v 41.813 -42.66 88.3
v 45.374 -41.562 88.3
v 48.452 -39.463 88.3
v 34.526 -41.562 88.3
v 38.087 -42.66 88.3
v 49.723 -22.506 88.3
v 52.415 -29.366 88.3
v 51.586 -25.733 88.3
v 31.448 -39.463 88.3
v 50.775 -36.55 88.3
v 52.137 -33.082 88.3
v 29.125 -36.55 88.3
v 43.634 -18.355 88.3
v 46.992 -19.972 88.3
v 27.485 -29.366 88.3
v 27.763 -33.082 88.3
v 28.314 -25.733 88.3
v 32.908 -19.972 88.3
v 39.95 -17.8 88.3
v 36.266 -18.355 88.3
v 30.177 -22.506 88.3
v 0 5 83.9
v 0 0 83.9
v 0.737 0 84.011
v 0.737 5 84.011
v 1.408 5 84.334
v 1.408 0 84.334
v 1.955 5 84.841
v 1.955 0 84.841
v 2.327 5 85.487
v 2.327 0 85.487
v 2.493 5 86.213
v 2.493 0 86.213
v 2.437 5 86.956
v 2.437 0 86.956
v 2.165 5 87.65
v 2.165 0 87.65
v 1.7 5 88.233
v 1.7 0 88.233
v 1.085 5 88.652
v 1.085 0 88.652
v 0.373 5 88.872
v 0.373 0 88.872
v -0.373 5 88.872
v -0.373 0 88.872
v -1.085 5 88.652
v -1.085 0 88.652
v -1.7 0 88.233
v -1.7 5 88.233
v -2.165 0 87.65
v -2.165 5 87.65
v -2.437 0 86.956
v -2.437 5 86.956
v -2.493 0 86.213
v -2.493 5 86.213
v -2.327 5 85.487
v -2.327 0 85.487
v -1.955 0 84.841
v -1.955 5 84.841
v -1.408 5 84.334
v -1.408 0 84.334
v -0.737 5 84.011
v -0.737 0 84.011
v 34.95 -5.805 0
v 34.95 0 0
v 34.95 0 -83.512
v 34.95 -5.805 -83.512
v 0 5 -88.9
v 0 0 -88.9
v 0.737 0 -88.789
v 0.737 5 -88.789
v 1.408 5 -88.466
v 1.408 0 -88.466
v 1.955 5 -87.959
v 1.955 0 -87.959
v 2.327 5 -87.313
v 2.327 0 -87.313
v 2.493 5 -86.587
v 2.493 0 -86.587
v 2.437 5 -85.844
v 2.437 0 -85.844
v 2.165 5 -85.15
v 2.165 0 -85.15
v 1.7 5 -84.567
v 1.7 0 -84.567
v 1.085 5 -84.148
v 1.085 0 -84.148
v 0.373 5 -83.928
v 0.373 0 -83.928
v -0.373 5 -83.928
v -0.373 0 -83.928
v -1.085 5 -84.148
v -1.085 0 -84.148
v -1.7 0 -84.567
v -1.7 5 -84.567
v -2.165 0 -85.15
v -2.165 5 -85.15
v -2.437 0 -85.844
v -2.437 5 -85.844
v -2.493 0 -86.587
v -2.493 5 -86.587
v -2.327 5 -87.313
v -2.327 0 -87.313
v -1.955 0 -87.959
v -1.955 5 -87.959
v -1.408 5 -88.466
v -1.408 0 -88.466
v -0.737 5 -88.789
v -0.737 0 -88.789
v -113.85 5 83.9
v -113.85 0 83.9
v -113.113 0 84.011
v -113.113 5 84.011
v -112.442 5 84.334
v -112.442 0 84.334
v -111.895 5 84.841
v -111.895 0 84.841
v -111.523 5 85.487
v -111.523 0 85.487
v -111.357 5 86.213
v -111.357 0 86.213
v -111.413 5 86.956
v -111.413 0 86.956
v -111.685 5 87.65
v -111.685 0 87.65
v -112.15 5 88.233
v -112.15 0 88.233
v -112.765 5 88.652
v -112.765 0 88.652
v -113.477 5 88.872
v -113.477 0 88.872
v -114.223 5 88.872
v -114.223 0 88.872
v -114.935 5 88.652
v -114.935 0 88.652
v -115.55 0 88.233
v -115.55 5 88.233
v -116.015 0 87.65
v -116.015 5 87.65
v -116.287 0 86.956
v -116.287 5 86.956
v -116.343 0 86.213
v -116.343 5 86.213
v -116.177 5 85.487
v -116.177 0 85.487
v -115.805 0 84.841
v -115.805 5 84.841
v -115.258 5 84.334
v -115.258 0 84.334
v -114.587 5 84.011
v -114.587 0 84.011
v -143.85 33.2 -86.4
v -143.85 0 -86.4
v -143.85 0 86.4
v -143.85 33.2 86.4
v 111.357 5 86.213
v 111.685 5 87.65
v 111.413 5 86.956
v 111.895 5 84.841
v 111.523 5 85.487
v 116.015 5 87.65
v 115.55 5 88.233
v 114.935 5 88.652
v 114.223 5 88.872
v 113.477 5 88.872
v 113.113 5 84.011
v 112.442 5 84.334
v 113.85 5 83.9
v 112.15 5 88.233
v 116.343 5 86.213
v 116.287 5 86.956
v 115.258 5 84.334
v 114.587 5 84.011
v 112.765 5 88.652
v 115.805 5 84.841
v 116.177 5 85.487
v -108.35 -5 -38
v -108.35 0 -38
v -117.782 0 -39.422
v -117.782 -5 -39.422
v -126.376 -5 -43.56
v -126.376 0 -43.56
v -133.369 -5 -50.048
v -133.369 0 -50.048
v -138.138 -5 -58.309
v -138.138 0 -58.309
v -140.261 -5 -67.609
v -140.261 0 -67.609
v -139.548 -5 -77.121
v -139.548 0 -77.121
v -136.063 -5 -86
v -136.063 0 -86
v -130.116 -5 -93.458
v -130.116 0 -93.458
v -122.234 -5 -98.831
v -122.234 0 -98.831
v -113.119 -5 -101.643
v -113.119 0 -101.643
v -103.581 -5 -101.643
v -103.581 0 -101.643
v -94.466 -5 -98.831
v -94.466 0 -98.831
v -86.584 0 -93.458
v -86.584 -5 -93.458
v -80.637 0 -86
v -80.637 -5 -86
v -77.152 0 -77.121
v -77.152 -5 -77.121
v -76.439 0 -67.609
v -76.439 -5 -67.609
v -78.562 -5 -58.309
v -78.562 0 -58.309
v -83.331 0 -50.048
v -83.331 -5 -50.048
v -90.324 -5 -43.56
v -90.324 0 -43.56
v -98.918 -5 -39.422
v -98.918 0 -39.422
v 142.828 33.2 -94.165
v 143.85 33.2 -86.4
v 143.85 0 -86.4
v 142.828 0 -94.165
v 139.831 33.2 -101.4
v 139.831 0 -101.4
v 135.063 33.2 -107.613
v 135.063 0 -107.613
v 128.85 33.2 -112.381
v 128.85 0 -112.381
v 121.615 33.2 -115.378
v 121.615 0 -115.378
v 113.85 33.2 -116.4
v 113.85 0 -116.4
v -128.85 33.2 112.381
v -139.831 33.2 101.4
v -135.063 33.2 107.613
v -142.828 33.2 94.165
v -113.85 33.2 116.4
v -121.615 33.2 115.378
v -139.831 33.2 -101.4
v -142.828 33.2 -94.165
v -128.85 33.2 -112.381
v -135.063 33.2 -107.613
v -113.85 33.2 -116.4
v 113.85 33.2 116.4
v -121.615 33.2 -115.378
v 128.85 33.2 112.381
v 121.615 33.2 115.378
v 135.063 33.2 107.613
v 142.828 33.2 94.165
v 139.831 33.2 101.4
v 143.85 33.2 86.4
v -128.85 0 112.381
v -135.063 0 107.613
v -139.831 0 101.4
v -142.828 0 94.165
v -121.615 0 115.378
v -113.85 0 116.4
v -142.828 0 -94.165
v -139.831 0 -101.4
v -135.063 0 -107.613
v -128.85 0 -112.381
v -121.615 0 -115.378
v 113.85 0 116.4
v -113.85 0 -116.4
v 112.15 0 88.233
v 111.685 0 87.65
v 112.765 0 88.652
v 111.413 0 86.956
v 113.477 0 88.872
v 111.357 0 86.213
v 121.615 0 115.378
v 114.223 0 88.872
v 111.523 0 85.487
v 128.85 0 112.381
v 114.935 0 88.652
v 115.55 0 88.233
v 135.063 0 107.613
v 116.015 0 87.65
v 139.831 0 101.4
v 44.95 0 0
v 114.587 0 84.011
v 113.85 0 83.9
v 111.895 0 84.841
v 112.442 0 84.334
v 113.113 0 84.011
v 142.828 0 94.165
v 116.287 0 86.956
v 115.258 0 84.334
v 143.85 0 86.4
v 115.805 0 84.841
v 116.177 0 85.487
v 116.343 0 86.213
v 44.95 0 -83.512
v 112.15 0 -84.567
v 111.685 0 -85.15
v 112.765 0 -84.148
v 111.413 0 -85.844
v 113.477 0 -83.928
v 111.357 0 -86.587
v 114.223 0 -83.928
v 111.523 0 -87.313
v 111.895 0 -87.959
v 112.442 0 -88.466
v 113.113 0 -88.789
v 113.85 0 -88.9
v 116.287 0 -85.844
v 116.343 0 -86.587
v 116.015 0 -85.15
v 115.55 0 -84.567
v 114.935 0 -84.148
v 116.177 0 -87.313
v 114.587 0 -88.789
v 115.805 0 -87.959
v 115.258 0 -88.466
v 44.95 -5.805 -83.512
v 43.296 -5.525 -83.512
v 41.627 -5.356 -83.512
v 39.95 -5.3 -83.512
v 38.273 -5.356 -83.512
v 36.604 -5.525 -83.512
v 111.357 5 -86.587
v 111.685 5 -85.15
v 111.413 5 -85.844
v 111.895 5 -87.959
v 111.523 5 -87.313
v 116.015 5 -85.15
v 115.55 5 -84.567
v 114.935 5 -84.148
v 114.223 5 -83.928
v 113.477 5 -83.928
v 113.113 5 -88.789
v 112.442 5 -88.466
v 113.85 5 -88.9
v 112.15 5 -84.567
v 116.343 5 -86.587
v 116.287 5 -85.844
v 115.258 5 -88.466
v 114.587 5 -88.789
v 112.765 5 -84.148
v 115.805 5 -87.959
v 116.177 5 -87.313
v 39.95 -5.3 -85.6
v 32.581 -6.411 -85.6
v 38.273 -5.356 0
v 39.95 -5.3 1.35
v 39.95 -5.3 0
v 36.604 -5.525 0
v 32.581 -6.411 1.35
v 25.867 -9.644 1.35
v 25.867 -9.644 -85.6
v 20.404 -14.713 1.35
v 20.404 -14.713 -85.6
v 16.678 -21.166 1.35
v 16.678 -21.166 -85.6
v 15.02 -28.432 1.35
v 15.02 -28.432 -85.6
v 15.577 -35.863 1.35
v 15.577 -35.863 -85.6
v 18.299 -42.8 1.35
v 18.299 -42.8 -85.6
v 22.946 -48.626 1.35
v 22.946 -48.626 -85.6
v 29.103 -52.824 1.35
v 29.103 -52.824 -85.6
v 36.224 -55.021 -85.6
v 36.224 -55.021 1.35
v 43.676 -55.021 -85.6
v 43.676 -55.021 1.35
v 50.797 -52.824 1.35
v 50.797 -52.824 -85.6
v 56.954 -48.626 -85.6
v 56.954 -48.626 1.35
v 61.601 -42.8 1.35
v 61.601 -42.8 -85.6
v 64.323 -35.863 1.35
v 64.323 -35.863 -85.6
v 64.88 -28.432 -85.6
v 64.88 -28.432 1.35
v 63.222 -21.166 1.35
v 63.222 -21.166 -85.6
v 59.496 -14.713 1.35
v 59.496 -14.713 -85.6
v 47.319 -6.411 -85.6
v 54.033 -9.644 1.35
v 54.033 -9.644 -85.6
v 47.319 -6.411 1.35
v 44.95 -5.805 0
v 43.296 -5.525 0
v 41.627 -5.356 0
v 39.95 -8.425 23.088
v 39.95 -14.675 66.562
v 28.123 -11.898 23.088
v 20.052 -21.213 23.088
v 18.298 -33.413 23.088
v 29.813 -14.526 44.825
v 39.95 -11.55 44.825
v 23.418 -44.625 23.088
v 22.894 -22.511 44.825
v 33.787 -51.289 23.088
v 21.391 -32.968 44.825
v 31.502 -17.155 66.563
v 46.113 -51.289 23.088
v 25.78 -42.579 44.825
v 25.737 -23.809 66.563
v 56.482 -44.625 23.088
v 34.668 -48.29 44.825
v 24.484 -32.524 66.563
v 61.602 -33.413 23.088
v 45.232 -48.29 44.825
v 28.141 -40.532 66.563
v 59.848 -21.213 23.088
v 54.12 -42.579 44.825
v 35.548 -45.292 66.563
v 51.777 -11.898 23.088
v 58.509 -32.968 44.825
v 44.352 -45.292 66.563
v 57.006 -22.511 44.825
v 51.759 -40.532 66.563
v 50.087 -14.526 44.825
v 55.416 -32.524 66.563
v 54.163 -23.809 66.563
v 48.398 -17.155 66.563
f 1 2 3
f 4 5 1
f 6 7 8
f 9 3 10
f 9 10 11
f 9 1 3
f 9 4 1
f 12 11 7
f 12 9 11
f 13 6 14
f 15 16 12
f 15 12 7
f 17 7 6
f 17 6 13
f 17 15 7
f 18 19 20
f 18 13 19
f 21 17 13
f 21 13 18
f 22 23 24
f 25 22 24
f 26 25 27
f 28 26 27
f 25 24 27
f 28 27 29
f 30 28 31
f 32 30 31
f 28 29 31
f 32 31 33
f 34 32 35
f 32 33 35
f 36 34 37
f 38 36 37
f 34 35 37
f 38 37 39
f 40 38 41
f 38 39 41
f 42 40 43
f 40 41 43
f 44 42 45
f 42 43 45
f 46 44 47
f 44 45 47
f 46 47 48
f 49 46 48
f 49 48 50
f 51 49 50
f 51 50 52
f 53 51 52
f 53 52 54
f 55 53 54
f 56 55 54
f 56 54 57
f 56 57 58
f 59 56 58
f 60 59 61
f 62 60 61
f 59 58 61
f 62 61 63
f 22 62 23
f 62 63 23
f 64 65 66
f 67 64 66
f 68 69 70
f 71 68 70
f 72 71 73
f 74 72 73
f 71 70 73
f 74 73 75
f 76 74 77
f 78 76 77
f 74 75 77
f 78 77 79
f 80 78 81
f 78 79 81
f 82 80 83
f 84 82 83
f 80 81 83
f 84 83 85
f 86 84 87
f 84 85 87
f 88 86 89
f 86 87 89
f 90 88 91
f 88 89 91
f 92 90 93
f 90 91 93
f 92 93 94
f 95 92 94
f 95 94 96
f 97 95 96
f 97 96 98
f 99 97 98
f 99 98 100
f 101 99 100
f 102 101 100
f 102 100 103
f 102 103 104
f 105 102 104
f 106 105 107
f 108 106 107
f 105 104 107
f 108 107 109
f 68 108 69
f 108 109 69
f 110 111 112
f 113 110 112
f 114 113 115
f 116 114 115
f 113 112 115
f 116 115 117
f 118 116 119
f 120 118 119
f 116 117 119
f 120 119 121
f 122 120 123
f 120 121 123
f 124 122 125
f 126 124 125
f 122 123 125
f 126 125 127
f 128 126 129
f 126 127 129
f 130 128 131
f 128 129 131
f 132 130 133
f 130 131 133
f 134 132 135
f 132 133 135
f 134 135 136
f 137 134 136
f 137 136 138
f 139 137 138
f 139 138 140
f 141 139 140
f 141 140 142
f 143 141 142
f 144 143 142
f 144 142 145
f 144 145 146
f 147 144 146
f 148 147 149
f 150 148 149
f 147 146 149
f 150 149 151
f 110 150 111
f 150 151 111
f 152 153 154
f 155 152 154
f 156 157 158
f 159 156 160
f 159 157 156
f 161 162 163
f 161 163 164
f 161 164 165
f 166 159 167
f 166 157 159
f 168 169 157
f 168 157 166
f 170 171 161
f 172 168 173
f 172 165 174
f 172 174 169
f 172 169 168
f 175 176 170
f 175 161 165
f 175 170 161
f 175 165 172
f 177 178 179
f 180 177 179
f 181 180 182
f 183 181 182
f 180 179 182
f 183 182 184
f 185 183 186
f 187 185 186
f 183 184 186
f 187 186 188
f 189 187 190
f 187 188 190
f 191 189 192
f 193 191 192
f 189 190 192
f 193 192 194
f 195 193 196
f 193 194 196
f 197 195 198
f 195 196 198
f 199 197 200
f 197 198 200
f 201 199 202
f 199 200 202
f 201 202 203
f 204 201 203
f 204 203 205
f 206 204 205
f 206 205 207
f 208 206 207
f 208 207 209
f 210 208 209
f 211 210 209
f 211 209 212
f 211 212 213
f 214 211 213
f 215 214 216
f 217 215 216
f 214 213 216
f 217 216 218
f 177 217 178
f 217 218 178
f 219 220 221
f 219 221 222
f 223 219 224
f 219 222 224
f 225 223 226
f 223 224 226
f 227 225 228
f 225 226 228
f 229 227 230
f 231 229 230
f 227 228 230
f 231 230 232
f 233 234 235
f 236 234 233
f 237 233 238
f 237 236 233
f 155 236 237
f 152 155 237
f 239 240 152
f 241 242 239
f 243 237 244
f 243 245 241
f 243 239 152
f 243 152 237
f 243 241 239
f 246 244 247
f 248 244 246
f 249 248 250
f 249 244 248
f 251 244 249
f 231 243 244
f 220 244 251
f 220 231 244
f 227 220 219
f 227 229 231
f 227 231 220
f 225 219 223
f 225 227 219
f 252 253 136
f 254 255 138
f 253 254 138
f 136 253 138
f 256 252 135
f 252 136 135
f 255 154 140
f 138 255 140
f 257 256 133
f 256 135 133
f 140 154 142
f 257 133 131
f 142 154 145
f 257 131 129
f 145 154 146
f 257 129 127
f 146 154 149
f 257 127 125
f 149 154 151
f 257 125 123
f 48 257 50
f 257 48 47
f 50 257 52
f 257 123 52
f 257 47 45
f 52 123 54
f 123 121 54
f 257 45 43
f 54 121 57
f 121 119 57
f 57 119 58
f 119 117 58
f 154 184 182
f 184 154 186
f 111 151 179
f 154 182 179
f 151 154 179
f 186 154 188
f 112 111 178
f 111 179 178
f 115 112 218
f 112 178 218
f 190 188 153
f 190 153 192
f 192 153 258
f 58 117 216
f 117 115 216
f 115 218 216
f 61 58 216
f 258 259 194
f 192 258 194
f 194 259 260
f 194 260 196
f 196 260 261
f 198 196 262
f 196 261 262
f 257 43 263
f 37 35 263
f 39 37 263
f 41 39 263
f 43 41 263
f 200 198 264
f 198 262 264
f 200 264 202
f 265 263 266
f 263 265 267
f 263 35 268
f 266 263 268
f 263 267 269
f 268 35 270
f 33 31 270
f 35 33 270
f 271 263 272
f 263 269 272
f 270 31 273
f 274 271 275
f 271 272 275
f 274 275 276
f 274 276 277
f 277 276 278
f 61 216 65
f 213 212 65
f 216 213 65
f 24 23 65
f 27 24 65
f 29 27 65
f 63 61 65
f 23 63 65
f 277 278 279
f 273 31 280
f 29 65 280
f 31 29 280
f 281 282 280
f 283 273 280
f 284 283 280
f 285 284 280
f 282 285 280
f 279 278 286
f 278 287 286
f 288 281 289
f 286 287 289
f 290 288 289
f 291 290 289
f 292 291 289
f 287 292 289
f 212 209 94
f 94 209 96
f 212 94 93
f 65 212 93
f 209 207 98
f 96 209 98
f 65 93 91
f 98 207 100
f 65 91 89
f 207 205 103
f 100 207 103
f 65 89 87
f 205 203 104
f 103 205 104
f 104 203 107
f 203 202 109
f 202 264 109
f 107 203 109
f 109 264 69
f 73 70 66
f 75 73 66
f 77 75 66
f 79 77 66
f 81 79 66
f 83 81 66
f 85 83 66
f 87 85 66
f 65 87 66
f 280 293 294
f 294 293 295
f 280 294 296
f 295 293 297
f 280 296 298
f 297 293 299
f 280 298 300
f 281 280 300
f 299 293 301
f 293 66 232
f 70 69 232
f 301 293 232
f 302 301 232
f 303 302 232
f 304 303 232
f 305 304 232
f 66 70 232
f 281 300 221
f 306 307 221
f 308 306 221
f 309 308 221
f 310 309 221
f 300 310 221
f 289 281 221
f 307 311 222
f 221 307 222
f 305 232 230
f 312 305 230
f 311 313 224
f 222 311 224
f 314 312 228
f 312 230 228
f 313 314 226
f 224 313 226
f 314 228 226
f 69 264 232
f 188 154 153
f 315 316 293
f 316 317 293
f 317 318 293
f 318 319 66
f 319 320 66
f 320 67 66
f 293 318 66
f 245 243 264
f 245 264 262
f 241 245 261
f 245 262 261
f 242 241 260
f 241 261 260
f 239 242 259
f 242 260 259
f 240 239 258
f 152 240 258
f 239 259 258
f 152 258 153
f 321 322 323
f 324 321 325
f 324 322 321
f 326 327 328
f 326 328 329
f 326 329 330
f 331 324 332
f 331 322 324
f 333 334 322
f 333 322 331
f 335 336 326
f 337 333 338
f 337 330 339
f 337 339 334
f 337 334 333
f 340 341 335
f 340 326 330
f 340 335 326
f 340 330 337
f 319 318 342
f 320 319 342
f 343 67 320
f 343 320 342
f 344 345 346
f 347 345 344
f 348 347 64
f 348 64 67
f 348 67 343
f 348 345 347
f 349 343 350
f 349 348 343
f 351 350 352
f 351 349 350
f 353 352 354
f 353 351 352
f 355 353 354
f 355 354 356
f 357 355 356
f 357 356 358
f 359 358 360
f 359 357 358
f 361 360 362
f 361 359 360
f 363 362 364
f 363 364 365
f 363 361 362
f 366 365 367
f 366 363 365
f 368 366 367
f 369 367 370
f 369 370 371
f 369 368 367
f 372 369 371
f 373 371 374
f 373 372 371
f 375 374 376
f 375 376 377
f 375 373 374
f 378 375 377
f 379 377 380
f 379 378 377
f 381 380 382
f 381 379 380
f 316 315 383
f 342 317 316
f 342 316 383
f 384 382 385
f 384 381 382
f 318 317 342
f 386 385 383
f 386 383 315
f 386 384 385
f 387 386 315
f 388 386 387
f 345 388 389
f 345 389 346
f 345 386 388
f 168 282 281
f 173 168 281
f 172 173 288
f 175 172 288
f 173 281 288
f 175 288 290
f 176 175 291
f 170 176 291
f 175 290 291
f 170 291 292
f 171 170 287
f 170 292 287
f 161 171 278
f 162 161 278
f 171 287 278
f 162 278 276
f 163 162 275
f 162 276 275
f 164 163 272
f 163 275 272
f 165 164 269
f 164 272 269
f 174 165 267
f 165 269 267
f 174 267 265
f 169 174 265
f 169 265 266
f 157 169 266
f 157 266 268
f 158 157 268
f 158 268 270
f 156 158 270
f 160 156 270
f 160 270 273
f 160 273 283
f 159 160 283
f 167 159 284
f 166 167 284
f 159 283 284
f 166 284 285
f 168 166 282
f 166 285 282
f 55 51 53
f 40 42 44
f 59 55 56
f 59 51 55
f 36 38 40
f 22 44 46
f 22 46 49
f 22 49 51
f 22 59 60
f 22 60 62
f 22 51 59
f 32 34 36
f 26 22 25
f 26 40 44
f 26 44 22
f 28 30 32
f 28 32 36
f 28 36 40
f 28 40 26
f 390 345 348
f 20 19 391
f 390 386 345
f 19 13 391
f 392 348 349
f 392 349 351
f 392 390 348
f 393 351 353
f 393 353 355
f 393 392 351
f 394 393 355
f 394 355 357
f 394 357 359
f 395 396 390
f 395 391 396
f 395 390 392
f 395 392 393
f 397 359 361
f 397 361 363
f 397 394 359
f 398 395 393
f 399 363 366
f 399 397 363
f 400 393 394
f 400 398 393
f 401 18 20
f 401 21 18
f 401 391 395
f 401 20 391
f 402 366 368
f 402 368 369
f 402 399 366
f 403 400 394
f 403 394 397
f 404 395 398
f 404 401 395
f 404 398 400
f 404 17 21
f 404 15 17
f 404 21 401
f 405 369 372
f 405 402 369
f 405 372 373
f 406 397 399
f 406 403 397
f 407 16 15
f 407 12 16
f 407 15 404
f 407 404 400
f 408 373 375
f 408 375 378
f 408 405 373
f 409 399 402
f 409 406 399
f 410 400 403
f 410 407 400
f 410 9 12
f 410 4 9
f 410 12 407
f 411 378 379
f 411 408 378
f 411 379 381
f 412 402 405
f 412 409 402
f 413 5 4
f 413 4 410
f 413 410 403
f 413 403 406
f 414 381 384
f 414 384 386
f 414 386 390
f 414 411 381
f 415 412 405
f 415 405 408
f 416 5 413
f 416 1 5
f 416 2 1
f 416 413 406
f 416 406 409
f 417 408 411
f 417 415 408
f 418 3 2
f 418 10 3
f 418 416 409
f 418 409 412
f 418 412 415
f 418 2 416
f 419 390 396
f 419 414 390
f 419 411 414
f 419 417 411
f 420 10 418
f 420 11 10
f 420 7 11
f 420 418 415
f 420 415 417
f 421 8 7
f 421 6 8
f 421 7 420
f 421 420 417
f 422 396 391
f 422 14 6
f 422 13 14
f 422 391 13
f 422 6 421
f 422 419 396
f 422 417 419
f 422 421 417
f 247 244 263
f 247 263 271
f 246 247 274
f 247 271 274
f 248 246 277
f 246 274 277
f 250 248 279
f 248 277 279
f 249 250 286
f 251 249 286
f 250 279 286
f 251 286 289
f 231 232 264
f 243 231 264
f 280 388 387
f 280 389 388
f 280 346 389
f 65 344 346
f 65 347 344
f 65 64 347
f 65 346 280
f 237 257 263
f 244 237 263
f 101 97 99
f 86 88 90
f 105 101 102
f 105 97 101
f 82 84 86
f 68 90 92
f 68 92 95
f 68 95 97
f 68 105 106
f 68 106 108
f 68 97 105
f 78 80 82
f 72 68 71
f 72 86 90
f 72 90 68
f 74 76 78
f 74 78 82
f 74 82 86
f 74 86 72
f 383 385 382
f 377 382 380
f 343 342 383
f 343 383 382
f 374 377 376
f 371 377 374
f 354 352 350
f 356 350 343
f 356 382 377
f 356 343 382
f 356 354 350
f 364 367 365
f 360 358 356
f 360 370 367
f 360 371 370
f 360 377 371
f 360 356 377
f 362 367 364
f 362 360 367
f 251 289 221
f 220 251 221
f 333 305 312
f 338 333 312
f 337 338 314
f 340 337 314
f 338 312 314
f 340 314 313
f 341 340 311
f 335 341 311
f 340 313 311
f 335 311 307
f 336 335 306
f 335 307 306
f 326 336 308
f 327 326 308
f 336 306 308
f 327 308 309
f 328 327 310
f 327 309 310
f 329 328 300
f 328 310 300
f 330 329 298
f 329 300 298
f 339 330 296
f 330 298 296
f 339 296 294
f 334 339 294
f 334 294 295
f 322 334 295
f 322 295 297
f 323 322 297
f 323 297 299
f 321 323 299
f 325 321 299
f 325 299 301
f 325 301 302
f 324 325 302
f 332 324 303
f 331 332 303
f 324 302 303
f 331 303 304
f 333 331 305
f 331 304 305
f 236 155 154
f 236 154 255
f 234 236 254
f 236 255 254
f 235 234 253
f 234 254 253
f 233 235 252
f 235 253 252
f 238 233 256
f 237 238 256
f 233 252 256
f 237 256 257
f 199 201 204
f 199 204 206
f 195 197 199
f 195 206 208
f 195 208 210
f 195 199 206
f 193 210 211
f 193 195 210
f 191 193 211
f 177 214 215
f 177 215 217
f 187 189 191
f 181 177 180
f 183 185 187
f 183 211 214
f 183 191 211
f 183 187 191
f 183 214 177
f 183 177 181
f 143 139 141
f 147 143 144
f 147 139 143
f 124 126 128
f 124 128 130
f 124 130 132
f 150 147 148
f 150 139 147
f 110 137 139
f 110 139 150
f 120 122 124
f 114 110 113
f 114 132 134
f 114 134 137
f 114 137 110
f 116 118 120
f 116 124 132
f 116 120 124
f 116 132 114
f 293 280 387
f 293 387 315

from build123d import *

# Parameters (mm, degrees)
BOSS_EXTRUDE1_DEPTH      = 33.2
BOSS_EXTRUDE2_DEPTH      = 5
BOSS_EXTRUDE2_DEPTH_BACK = 5
SKETCH4_W                = 83.511672616
SKETCH4_H                = 9.134615549
SKETCH5_R                = 32
BOSS_EXTRUDE3_DEPTH      = 5
SKETCH6_R                = 2.5
CUT_EXTRUDE1_DEPTH       = 5


with BuildPart() as part:
    # Sketch2 → Boss-Extrude1 (new body)
    with BuildSketch(Plane(origin=(0, 0, 0), x_dir=(1, 0, 0), z_dir=(0, 1, 0))):
        with BuildLine():
            ThreePointArc((-143.85, -86.4), (-135.063203436, -107.613203436), (-113.85, -116.4))
            Line((-113.85, -116.4), (113.85, -116.4))
            ThreePointArc((113.85, -116.4), (135.063203436, -107.613203436), (143.85, -86.4))
            Line((143.85, -86.4), (143.85, 86.4))
            ThreePointArc((143.85, 86.4), (135.063203436, 107.613203436), (113.85, 116.4))
            Line((113.85, 116.4), (-113.85, 116.4))
            ThreePointArc((-113.85, 116.4), (-135.063203436, 107.613203436), (-143.85, 86.4))
            Line((-143.85, 86.4), (-143.85, -86.4))
        make_face()
    extrude(amount=BOSS_EXTRUDE1_DEPTH)



with BuildPart() as body_2:
    # Sketch3 → Revolve2 (revolve)
    with BuildSketch(Plane(origin=(39.95, 0, 0), x_dir=(0, 0, -1), z_dir=(1, 0, 0))):
        Polygon((85.6, -30.3), (85.6, -5.3), (-1.35, -5.3), (-88.3, -17.8), (-88.3, -30.3), align=None)
    revolve(axis=Axis((39.95, -30.3, -85.6), (0, 0, 1)))


with BuildPart() as part_1:
    add(part.part)

    add(body_2.part)  # Boss-Extrude2 merges body 2
    # Sketch4 → Boss-Extrude2 (add, two sides: drawn at the far end of the back side and taken through both)
    with BuildSketch(Plane(origin=(39.95, 0, 0), x_dir=(0, 0, -1), z_dir=(1, 0, 0)).offset(-BOSS_EXTRUDE2_DEPTH_BACK)):
        with Locations((41.755836308, -4.567307775)):
            Rectangle(SKETCH4_W, SKETCH4_H)
    extrude(amount=BOSS_EXTRUDE2_DEPTH + BOSS_EXTRUDE2_DEPTH_BACK)

    # Sketch5 → Boss-Extrude3 (add)
    with BuildSketch(Plane.XZ):
        with Locations(Location((-108.35, -70, 0), (0, 0, 90))):
            Circle(SKETCH5_R)
    extrude(amount=BOSS_EXTRUDE3_DEPTH)

    # Sketch6 → Cut-Extrude1 (cut)
    with BuildSketch(Plane.XZ):
        with Locations(Location((113.85, -86.4, 0), (0, 0, 270))):
            Circle(SKETCH6_R)
        with Locations(Location((0, -86.4, 0), (0, 0, 270))):
            Circle(SKETCH6_R)
        with Locations(Location((113.85, 86.4, 0), (0, 0, 270))):
            Circle(SKETCH6_R)
        with Locations(Location((0, 86.4, 0), (0, 0, 270))):
            Circle(SKETCH6_R)
        with Locations(Location((-113.85, 86.4, 0), (0, 0, 270))):
            Circle(SKETCH6_R)
    extrude(amount=-CUT_EXTRUDE1_DEPTH, mode=Mode.SUBTRACT)


solid = part_1.part
